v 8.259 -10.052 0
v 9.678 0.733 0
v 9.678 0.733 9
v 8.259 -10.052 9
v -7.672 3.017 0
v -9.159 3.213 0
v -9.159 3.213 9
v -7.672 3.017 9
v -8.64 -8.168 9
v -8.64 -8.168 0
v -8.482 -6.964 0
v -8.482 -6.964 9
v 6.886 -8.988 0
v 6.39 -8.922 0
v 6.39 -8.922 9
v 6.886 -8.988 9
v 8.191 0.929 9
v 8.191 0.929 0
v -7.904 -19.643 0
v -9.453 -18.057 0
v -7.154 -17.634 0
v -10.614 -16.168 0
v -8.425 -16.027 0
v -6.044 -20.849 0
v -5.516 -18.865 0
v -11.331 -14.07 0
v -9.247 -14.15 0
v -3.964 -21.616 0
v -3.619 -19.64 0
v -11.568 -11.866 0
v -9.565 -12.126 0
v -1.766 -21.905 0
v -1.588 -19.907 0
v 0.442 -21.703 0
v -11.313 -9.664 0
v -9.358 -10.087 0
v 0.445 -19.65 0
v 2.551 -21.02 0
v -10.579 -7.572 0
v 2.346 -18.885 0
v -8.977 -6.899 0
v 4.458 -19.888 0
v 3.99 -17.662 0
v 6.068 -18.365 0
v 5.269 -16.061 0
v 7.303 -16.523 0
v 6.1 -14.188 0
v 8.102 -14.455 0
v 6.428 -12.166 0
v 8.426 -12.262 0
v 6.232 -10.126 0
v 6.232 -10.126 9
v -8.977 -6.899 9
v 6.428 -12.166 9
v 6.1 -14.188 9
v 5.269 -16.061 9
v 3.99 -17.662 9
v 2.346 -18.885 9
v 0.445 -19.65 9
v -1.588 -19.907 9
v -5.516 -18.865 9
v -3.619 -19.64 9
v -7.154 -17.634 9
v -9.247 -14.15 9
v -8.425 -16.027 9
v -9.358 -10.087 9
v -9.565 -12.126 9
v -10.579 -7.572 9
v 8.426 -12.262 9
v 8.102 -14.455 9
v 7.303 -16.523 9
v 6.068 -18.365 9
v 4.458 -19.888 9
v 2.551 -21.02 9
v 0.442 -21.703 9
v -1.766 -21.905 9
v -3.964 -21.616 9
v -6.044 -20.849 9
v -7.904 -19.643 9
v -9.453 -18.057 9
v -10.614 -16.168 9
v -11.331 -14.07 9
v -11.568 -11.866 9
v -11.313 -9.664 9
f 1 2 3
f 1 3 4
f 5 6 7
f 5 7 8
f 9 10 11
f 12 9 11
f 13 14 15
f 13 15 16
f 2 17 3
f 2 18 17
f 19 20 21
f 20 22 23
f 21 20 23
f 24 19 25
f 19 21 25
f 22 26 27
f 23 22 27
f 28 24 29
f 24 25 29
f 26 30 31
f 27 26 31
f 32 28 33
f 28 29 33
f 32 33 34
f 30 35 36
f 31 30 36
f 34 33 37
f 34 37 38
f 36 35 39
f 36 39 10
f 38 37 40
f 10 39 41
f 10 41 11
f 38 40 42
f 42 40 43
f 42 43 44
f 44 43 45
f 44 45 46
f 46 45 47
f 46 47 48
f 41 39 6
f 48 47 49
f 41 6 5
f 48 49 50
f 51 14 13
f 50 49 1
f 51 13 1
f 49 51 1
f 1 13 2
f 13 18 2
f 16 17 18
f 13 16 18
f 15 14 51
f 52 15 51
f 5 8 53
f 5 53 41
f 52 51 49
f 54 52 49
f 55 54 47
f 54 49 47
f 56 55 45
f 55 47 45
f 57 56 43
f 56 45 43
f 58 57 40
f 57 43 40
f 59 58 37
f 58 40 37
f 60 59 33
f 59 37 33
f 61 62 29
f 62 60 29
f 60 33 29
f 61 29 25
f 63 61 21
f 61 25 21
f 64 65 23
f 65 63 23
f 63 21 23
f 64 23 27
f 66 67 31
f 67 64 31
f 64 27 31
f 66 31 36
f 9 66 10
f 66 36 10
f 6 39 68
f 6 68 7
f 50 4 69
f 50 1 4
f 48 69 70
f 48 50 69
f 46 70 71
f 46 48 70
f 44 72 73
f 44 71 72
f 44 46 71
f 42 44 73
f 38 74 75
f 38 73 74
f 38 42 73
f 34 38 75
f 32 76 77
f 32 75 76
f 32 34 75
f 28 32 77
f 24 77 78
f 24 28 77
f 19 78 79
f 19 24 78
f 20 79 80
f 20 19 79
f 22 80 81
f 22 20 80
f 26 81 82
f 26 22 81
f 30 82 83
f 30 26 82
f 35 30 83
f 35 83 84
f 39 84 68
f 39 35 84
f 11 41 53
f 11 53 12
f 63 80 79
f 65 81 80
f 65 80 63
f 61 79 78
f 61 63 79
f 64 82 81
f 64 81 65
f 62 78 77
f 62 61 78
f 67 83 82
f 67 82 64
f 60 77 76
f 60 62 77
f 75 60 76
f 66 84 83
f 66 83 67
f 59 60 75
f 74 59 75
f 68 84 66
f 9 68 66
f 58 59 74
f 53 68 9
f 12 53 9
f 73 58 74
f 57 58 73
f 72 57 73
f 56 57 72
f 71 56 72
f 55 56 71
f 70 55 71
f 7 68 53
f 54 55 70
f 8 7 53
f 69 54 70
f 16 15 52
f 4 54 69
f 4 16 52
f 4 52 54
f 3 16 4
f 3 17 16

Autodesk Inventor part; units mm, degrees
ref_plane "YZ Plane" through (0, 0, 0) normal (1, 0, 0) x (0, 1, 0)
ref_plane "XZ Plane" through (0, 0, 0) normal (0, 1, 0) x (-1, 0, 0)
sketch "Sketch1" plane through (0, 0, 0) normal (0, 0, 1) x (1, 0, 0)
  arc A0 (-8.6401, -8.1682) -> (6.2316, -10.1261) centre (-1.5676, -11.9073) ccw projected
  line L0 (7.4345, -0.9889) -> (6.2316, -10.1261) projected
  line L1 (-7.4371, 0.969) -> (7.4345, -0.9889) projected
  line L2 (-8.6401, -8.1682) -> (-7.4371, 0.969) projected
  line L3 (0.03, -17.852) -> (-0.1568, -19.2714) projected
  line L4 (-0.1568, -19.2714) -> (-0.6894, -19.2013) projected
  spline S0 degree 3 poles (-0.6894, -19.2013) (-0.7386, -19.1939) (-0.8276, -19.1805) (-0.9085, -19.1413) (-0.9446, -19.1238) knots 0 0 0 0 0.014823 0.02681 0.02681 0.02681 0.02681 projected
  spline S1 degree 3 poles (-0.9446, -19.1238) (-0.9734, -19.1035) (-1.0308, -19.0631) (-1.0644, -19.0015) (-1.0811, -18.9709) knots 0 0 0 0 0.010419 0.020741 0.020741 0.020741 0.020741 projected
  spline S2 degree 3 poles (-1.0811, -18.9709) (-1.0934, -18.9389) (-1.1175, -18.8762) (-1.1139, -18.8091) (-1.1121, -18.7762) knots 0 0 0 0 0.010155 0.019912 0.019912 0.019912 0.019912 projected
  spline S3 degree 3 poles (-1.1121, -18.7762) (-1.106, -18.7465) (-1.0937, -18.6864) (-1.0581, -18.6365) (-1.0402, -18.6114) knots 0 0 0 0 0.008998 0.018167 0.018167 0.018167 0.018167 projected
  spline S4 degree 3 poles (-1.0402, -18.6114) (-1.0175, -18.5881) (-0.9702, -18.5394) (-0.907, -18.5143) (-0.874, -18.5012) knots 0 0 0 0 0.009628 0.020138 0.020138 0.020138 0.020138 projected
  spline S5 degree 3 poles (-0.874, -18.5012) (-0.912, -18.4819) (-0.9849, -18.4448) (-1.0323, -18.3782) (-1.055, -18.3464) knots 0 0 0 0 0.012589 0.024139 0.024139 0.024139 0.024139 projected
  spline S6 degree 3 poles (-1.055, -18.3464) (-1.071, -18.3116) (-1.1036, -18.2405) (-1.0985, -18.1623) (-1.096, -18.1224) knots 0 0 0 0 0.011297 0.023097 0.023097 0.023097 0.023097 projected
  spline S7 degree 3 poles (-1.096, -18.1224) (-1.09, -18.0901) (-1.0782, -18.0263) (-1.0456, -17.9702) (-1.0294, -17.9425) knots 0 0 0 0 0.009763 0.019307 0.019307 0.019307 0.019307 projected
  spline S8 degree 3 poles (-1.0294, -17.9425) (-1.0117, -17.9179) (-0.9781, -17.8713) (-0.9305, -17.8392) (-0.9079, -17.824) knots 0 0 0 0 0.009007 0.017087 0.017087 0.017087 0.017087 projected
  spline S9 degree 3 poles (-0.9079, -17.824) (-0.8832, -17.8123) (-0.8309, -17.7874) (-0.7736, -17.7788) (-0.7433, -17.7743) knots 0 0 0 0 0.008157 0.017283 0.017283 0.017283 0.017283 projected
  spline S10 degree 3 poles (-0.7433, -17.7743) (-0.7078, -17.7719) (-0.6303, -17.7668) (-0.5531, -17.7758) (-0.5112, -17.7807) knots 0 0 0 0 0.010638 0.023262 0.023262 0.023262 0.023262 projected
  line L5 (-0.5112, -17.7807) -> (0.03, -17.852) projected
  line L6 (-3.4981, -17.3875) -> (-3.685, -18.8069) projected
  line L7 (-3.685, -18.8069) -> (-3.8728, -18.7821) projected
  line L8 (-3.8728, -18.7821) -> (-3.7802, -18.0783) projected
  line L9 (-3.7802, -18.0783) -> (-4.5777, -18.6893) projected
  line L10 (-4.5777, -18.6893) -> (-4.8323, -18.6558) projected
  line L11 (-4.8323, -18.6558) -> (-4.1612, -18.1591) projected
  line L12 (-4.1612, -18.1591) -> (-4.6716, -17.233) projected
  line L13 (-4.6716, -17.233) -> (-4.4237, -17.2656) projected
  line L14 (-4.4237, -17.2656) -> (-4.0129, -18.0506) projected
  line L15 (-4.0129, -18.0506) -> (-3.7507, -17.8546) projected
  line L16 (-3.7507, -17.8546) -> (-3.686, -17.3627) projected
  line L17 (-3.686, -17.3627) -> (-3.4981, -17.3875) projected
  circle A1 centre (-5.3501, -2.3316) radius 1.25 projected
  circle A2 centre (-0.3929, -2.9842) radius 1.25 projected
  circle A3 centre (4.5643, -3.6369) radius 1.25 projected
  line L18 (-1.8861, -17.5997) -> (-1.7118, -17.6227) projected
  line L19 (-1.7118, -17.6227) -> (-1.858, -18.7332) projected
  spline S11 degree 3 poles (-1.858, -18.7332) (-1.8315, -18.7156) (-1.7741, -18.6776) (-1.7111, -18.6498) (-1.6771, -18.6349) knots 0 0 0 0 0.009512 0.020621 0.020621 0.020621 0.020621 projected
  spline S12 degree 3 poles (-1.6771, -18.6349) (-1.6428, -18.6208) (-1.579, -18.5947) (-1.5125, -18.5771) (-1.4818, -18.569) knots 0 0 0 0 0.011121 0.020634 0.020634 0.020634 0.020634 projected
  line L20 (-1.4818, -18.569) -> (-1.5039, -18.7374) projected
  spline S13 degree 3 poles (-1.5039, -18.7374) (-1.5538, -18.755) (-1.6511, -18.7893) (-1.7387, -18.8438) (-1.7815, -18.8703) knots 0 0 0 0 0.015802 0.030852 0.030852 0.030852 0.030852 projected
  spline S14 degree 3 poles (-1.7815, -18.8703) (-1.8184, -18.8967) (-1.8862, -18.945) (-1.9379, -19.0101) (-1.9614, -19.0397) knots 0 0 0 0 0.013536 0.024817 0.024817 0.024817 0.024817 projected
  line L21 (-1.9614, -19.0397) -> (-2.0737, -19.0249) projected
  line L22 (-2.0737, -19.0249) -> (-1.8861, -17.5997) projected
  spline S15 degree 3 poles (-2.4246, -18.241) (-2.4356, -18.317) (-2.4555, -18.4539) (-2.5069, -18.5823) (-2.5297, -18.6393) knots 0 0 0 0 0.02295 0.041329 0.041329 0.041329 0.041329 projected
  spline S16 degree 3 poles (-2.5297, -18.6393) (-2.5543, -18.6843) (-2.6009, -18.7695) (-2.6782, -18.8281) (-2.7148, -18.8558) knots 0 0 0 0 0.015169 0.02877 0.02877 0.02877 0.02877 projected
  spline S17 degree 3 poles (-2.7148, -18.8558) (-2.7553, -18.8752) (-2.84, -18.9157) (-2.9339, -18.9088) (-2.9828, -18.9052) knots 0 0 0 0 0.013229 0.027677 0.027677 0.027677 0.027677 projected
  spline S18 degree 3 poles (-2.9828, -18.9052) (-3.0189, -18.8989) (-3.0882, -18.8866) (-3.1483, -18.8503) (-3.1772, -18.8328) knots 0 0 0 0 0.010877 0.0209 0.0209 0.0209 0.0209 projected
  spline S19 degree 3 poles (-3.1772, -18.8328) (-3.2025, -18.812) (-3.254, -18.7696) (-3.2859, -18.7111) (-3.3021, -18.6815) knots 0 0 0 0 0.009749 0.019786 0.019786 0.019786 0.019786 projected
  spline S20 degree 3 poles (-3.3021, -18.6815) (-3.3159, -18.6476) (-3.3452, -18.5759) (-3.3564, -18.4992) (-3.3624, -18.4588) knots 0 0 0 0 0.010931 0.023145 0.023145 0.023145 0.023145 projected
  spline S21 degree 3 poles (-3.3624, -18.4588) (-3.3653, -18.409) (-3.3719, -18.2955) (-3.358, -18.1825) (-3.3502, -18.1191) knots 0 0 0 0 0.014931 0.034052 0.034052 0.034052 0.034052 projected
  spline S22 degree 3 poles (-3.3502, -18.1191) (-3.3392, -18.0436) (-3.3193, -17.9073) (-3.2684, -17.7795) (-3.2458, -17.7226) knots 0 0 0 0 0.022803 0.041126 0.041126 0.041126 0.041126 projected
  spline S23 degree 3 poles (-3.2458, -17.7226) (-3.2213, -17.6776) (-3.1749, -17.5922) (-3.0976, -17.5334) (-3.0611, -17.5056) knots 0 0 0 0 0.015164 0.028785 0.028785 0.028785 0.028785 projected
  spline S24 degree 3 poles (-3.0611, -17.5056) (-3.0205, -17.4861) (-2.9355, -17.4453) (-2.8413, -17.4522) (-2.792, -17.4558) knots 0 0 0 0 0.013268 0.02779 0.02779 0.02779 0.02779 projected
  spline S25 degree 3 poles (-2.792, -17.4558) (-2.7285, -17.4698) (-2.6047, -17.4969) (-2.5269, -17.5968) (-2.489, -17.6454) knots 0 0 0 0 0.01885 0.036767 0.036767 0.036767 0.036767 projected
  spline S26 degree 3 poles (-2.489, -17.6454) (-2.4583, -17.7269) (-2.386, -17.9186) (-2.4105, -18.1233) (-2.4246, -18.241) knots 0 0 0 0 0.025776 0.060673 0.060673 0.060673 0.060673 projected
  arc A4 (-10.5788, -7.5715) -> (8.2587, -10.0515) centre (-1.5676, -11.9073) ccw
  line L23 (-10.5788, -7.5715) -> (-9.159, 3.213)
  line L24 (-9.159, 3.213) -> (9.6785, 0.733)
  line L25 (9.6785, 0.733) -> (8.2587, -10.0515)
  point P0 (0, 0)
  dimension "d0" = 2
ref_plane "Work Plane1" through (-4.5785, -14.9902, 9) normal (0, 0, -1) x (0, 1, 0)
extrude "Extrusion1" add sketch "Sketch1" along normal up to surface (9 mm away) contours L23 L24 L25 A4
sketch "Sketch2" plane through (9.6785, 0.733, 9) normal (0.1305, 0.9914, 0) x (0.9914, -0.1305, 0)
  line L0 (-17.5, 0) -> (-17.5, 9) projected
  line L1 (-1.5, 0) -> (-1.5, 9) projected
  line L2 (-17.5, 0) -> (-1.5, 0)
  line L3 (-1.5, 0) -> (-1.5, 9)
  line L4 (-1.5, 9) -> (-17.5, 9)
  line L5 (-17.5, 9) -> (-17.5, 0)
  point P0 (-9.5, 9)
  point P1 (-1.5, 0)
extrude "Extrusion2" cut sketch "Sketch2" against normal blind 10
properties part number "PotHolder"
